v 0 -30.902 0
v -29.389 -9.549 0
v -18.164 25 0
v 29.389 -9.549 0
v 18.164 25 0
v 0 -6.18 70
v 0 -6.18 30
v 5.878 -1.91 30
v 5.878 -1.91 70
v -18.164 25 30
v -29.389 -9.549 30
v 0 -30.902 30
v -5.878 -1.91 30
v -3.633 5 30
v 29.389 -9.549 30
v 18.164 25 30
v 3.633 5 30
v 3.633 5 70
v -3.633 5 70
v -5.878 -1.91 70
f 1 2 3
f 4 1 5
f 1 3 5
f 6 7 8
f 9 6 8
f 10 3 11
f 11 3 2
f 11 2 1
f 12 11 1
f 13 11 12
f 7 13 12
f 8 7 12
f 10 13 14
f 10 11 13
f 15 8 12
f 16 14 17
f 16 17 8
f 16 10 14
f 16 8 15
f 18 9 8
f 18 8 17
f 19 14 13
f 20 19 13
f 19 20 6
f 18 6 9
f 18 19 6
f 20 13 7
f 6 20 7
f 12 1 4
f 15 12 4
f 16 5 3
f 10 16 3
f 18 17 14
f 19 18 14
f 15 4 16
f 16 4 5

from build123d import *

# Parameters (mm, degrees)
F1_DEPTH = 30
F3_DEPTH = 40


with BuildPart() as f1:
    # F0 (on Top) → F1 (new body)
    with BuildSketch(Plane.XY):
        Polygon((18.163563, 25), (-18.163563, 25), (-29.389263, -9.54915), (0, -30.901699), (29.389263, -9.54915), align=None)
    extrude(amount=F1_DEPTH)

    # F2 (on face) → F3 (join)
    with BuildSketch(Plane.XY.offset(30)):
        Polygon((-5.877853, -1.90983), (0, -6.18034), (5.877853, -1.90983), (3.632713, 5), (-3.632713, 5), align=None)
    extrude(amount=F3_DEPTH)


solid = f1.part
